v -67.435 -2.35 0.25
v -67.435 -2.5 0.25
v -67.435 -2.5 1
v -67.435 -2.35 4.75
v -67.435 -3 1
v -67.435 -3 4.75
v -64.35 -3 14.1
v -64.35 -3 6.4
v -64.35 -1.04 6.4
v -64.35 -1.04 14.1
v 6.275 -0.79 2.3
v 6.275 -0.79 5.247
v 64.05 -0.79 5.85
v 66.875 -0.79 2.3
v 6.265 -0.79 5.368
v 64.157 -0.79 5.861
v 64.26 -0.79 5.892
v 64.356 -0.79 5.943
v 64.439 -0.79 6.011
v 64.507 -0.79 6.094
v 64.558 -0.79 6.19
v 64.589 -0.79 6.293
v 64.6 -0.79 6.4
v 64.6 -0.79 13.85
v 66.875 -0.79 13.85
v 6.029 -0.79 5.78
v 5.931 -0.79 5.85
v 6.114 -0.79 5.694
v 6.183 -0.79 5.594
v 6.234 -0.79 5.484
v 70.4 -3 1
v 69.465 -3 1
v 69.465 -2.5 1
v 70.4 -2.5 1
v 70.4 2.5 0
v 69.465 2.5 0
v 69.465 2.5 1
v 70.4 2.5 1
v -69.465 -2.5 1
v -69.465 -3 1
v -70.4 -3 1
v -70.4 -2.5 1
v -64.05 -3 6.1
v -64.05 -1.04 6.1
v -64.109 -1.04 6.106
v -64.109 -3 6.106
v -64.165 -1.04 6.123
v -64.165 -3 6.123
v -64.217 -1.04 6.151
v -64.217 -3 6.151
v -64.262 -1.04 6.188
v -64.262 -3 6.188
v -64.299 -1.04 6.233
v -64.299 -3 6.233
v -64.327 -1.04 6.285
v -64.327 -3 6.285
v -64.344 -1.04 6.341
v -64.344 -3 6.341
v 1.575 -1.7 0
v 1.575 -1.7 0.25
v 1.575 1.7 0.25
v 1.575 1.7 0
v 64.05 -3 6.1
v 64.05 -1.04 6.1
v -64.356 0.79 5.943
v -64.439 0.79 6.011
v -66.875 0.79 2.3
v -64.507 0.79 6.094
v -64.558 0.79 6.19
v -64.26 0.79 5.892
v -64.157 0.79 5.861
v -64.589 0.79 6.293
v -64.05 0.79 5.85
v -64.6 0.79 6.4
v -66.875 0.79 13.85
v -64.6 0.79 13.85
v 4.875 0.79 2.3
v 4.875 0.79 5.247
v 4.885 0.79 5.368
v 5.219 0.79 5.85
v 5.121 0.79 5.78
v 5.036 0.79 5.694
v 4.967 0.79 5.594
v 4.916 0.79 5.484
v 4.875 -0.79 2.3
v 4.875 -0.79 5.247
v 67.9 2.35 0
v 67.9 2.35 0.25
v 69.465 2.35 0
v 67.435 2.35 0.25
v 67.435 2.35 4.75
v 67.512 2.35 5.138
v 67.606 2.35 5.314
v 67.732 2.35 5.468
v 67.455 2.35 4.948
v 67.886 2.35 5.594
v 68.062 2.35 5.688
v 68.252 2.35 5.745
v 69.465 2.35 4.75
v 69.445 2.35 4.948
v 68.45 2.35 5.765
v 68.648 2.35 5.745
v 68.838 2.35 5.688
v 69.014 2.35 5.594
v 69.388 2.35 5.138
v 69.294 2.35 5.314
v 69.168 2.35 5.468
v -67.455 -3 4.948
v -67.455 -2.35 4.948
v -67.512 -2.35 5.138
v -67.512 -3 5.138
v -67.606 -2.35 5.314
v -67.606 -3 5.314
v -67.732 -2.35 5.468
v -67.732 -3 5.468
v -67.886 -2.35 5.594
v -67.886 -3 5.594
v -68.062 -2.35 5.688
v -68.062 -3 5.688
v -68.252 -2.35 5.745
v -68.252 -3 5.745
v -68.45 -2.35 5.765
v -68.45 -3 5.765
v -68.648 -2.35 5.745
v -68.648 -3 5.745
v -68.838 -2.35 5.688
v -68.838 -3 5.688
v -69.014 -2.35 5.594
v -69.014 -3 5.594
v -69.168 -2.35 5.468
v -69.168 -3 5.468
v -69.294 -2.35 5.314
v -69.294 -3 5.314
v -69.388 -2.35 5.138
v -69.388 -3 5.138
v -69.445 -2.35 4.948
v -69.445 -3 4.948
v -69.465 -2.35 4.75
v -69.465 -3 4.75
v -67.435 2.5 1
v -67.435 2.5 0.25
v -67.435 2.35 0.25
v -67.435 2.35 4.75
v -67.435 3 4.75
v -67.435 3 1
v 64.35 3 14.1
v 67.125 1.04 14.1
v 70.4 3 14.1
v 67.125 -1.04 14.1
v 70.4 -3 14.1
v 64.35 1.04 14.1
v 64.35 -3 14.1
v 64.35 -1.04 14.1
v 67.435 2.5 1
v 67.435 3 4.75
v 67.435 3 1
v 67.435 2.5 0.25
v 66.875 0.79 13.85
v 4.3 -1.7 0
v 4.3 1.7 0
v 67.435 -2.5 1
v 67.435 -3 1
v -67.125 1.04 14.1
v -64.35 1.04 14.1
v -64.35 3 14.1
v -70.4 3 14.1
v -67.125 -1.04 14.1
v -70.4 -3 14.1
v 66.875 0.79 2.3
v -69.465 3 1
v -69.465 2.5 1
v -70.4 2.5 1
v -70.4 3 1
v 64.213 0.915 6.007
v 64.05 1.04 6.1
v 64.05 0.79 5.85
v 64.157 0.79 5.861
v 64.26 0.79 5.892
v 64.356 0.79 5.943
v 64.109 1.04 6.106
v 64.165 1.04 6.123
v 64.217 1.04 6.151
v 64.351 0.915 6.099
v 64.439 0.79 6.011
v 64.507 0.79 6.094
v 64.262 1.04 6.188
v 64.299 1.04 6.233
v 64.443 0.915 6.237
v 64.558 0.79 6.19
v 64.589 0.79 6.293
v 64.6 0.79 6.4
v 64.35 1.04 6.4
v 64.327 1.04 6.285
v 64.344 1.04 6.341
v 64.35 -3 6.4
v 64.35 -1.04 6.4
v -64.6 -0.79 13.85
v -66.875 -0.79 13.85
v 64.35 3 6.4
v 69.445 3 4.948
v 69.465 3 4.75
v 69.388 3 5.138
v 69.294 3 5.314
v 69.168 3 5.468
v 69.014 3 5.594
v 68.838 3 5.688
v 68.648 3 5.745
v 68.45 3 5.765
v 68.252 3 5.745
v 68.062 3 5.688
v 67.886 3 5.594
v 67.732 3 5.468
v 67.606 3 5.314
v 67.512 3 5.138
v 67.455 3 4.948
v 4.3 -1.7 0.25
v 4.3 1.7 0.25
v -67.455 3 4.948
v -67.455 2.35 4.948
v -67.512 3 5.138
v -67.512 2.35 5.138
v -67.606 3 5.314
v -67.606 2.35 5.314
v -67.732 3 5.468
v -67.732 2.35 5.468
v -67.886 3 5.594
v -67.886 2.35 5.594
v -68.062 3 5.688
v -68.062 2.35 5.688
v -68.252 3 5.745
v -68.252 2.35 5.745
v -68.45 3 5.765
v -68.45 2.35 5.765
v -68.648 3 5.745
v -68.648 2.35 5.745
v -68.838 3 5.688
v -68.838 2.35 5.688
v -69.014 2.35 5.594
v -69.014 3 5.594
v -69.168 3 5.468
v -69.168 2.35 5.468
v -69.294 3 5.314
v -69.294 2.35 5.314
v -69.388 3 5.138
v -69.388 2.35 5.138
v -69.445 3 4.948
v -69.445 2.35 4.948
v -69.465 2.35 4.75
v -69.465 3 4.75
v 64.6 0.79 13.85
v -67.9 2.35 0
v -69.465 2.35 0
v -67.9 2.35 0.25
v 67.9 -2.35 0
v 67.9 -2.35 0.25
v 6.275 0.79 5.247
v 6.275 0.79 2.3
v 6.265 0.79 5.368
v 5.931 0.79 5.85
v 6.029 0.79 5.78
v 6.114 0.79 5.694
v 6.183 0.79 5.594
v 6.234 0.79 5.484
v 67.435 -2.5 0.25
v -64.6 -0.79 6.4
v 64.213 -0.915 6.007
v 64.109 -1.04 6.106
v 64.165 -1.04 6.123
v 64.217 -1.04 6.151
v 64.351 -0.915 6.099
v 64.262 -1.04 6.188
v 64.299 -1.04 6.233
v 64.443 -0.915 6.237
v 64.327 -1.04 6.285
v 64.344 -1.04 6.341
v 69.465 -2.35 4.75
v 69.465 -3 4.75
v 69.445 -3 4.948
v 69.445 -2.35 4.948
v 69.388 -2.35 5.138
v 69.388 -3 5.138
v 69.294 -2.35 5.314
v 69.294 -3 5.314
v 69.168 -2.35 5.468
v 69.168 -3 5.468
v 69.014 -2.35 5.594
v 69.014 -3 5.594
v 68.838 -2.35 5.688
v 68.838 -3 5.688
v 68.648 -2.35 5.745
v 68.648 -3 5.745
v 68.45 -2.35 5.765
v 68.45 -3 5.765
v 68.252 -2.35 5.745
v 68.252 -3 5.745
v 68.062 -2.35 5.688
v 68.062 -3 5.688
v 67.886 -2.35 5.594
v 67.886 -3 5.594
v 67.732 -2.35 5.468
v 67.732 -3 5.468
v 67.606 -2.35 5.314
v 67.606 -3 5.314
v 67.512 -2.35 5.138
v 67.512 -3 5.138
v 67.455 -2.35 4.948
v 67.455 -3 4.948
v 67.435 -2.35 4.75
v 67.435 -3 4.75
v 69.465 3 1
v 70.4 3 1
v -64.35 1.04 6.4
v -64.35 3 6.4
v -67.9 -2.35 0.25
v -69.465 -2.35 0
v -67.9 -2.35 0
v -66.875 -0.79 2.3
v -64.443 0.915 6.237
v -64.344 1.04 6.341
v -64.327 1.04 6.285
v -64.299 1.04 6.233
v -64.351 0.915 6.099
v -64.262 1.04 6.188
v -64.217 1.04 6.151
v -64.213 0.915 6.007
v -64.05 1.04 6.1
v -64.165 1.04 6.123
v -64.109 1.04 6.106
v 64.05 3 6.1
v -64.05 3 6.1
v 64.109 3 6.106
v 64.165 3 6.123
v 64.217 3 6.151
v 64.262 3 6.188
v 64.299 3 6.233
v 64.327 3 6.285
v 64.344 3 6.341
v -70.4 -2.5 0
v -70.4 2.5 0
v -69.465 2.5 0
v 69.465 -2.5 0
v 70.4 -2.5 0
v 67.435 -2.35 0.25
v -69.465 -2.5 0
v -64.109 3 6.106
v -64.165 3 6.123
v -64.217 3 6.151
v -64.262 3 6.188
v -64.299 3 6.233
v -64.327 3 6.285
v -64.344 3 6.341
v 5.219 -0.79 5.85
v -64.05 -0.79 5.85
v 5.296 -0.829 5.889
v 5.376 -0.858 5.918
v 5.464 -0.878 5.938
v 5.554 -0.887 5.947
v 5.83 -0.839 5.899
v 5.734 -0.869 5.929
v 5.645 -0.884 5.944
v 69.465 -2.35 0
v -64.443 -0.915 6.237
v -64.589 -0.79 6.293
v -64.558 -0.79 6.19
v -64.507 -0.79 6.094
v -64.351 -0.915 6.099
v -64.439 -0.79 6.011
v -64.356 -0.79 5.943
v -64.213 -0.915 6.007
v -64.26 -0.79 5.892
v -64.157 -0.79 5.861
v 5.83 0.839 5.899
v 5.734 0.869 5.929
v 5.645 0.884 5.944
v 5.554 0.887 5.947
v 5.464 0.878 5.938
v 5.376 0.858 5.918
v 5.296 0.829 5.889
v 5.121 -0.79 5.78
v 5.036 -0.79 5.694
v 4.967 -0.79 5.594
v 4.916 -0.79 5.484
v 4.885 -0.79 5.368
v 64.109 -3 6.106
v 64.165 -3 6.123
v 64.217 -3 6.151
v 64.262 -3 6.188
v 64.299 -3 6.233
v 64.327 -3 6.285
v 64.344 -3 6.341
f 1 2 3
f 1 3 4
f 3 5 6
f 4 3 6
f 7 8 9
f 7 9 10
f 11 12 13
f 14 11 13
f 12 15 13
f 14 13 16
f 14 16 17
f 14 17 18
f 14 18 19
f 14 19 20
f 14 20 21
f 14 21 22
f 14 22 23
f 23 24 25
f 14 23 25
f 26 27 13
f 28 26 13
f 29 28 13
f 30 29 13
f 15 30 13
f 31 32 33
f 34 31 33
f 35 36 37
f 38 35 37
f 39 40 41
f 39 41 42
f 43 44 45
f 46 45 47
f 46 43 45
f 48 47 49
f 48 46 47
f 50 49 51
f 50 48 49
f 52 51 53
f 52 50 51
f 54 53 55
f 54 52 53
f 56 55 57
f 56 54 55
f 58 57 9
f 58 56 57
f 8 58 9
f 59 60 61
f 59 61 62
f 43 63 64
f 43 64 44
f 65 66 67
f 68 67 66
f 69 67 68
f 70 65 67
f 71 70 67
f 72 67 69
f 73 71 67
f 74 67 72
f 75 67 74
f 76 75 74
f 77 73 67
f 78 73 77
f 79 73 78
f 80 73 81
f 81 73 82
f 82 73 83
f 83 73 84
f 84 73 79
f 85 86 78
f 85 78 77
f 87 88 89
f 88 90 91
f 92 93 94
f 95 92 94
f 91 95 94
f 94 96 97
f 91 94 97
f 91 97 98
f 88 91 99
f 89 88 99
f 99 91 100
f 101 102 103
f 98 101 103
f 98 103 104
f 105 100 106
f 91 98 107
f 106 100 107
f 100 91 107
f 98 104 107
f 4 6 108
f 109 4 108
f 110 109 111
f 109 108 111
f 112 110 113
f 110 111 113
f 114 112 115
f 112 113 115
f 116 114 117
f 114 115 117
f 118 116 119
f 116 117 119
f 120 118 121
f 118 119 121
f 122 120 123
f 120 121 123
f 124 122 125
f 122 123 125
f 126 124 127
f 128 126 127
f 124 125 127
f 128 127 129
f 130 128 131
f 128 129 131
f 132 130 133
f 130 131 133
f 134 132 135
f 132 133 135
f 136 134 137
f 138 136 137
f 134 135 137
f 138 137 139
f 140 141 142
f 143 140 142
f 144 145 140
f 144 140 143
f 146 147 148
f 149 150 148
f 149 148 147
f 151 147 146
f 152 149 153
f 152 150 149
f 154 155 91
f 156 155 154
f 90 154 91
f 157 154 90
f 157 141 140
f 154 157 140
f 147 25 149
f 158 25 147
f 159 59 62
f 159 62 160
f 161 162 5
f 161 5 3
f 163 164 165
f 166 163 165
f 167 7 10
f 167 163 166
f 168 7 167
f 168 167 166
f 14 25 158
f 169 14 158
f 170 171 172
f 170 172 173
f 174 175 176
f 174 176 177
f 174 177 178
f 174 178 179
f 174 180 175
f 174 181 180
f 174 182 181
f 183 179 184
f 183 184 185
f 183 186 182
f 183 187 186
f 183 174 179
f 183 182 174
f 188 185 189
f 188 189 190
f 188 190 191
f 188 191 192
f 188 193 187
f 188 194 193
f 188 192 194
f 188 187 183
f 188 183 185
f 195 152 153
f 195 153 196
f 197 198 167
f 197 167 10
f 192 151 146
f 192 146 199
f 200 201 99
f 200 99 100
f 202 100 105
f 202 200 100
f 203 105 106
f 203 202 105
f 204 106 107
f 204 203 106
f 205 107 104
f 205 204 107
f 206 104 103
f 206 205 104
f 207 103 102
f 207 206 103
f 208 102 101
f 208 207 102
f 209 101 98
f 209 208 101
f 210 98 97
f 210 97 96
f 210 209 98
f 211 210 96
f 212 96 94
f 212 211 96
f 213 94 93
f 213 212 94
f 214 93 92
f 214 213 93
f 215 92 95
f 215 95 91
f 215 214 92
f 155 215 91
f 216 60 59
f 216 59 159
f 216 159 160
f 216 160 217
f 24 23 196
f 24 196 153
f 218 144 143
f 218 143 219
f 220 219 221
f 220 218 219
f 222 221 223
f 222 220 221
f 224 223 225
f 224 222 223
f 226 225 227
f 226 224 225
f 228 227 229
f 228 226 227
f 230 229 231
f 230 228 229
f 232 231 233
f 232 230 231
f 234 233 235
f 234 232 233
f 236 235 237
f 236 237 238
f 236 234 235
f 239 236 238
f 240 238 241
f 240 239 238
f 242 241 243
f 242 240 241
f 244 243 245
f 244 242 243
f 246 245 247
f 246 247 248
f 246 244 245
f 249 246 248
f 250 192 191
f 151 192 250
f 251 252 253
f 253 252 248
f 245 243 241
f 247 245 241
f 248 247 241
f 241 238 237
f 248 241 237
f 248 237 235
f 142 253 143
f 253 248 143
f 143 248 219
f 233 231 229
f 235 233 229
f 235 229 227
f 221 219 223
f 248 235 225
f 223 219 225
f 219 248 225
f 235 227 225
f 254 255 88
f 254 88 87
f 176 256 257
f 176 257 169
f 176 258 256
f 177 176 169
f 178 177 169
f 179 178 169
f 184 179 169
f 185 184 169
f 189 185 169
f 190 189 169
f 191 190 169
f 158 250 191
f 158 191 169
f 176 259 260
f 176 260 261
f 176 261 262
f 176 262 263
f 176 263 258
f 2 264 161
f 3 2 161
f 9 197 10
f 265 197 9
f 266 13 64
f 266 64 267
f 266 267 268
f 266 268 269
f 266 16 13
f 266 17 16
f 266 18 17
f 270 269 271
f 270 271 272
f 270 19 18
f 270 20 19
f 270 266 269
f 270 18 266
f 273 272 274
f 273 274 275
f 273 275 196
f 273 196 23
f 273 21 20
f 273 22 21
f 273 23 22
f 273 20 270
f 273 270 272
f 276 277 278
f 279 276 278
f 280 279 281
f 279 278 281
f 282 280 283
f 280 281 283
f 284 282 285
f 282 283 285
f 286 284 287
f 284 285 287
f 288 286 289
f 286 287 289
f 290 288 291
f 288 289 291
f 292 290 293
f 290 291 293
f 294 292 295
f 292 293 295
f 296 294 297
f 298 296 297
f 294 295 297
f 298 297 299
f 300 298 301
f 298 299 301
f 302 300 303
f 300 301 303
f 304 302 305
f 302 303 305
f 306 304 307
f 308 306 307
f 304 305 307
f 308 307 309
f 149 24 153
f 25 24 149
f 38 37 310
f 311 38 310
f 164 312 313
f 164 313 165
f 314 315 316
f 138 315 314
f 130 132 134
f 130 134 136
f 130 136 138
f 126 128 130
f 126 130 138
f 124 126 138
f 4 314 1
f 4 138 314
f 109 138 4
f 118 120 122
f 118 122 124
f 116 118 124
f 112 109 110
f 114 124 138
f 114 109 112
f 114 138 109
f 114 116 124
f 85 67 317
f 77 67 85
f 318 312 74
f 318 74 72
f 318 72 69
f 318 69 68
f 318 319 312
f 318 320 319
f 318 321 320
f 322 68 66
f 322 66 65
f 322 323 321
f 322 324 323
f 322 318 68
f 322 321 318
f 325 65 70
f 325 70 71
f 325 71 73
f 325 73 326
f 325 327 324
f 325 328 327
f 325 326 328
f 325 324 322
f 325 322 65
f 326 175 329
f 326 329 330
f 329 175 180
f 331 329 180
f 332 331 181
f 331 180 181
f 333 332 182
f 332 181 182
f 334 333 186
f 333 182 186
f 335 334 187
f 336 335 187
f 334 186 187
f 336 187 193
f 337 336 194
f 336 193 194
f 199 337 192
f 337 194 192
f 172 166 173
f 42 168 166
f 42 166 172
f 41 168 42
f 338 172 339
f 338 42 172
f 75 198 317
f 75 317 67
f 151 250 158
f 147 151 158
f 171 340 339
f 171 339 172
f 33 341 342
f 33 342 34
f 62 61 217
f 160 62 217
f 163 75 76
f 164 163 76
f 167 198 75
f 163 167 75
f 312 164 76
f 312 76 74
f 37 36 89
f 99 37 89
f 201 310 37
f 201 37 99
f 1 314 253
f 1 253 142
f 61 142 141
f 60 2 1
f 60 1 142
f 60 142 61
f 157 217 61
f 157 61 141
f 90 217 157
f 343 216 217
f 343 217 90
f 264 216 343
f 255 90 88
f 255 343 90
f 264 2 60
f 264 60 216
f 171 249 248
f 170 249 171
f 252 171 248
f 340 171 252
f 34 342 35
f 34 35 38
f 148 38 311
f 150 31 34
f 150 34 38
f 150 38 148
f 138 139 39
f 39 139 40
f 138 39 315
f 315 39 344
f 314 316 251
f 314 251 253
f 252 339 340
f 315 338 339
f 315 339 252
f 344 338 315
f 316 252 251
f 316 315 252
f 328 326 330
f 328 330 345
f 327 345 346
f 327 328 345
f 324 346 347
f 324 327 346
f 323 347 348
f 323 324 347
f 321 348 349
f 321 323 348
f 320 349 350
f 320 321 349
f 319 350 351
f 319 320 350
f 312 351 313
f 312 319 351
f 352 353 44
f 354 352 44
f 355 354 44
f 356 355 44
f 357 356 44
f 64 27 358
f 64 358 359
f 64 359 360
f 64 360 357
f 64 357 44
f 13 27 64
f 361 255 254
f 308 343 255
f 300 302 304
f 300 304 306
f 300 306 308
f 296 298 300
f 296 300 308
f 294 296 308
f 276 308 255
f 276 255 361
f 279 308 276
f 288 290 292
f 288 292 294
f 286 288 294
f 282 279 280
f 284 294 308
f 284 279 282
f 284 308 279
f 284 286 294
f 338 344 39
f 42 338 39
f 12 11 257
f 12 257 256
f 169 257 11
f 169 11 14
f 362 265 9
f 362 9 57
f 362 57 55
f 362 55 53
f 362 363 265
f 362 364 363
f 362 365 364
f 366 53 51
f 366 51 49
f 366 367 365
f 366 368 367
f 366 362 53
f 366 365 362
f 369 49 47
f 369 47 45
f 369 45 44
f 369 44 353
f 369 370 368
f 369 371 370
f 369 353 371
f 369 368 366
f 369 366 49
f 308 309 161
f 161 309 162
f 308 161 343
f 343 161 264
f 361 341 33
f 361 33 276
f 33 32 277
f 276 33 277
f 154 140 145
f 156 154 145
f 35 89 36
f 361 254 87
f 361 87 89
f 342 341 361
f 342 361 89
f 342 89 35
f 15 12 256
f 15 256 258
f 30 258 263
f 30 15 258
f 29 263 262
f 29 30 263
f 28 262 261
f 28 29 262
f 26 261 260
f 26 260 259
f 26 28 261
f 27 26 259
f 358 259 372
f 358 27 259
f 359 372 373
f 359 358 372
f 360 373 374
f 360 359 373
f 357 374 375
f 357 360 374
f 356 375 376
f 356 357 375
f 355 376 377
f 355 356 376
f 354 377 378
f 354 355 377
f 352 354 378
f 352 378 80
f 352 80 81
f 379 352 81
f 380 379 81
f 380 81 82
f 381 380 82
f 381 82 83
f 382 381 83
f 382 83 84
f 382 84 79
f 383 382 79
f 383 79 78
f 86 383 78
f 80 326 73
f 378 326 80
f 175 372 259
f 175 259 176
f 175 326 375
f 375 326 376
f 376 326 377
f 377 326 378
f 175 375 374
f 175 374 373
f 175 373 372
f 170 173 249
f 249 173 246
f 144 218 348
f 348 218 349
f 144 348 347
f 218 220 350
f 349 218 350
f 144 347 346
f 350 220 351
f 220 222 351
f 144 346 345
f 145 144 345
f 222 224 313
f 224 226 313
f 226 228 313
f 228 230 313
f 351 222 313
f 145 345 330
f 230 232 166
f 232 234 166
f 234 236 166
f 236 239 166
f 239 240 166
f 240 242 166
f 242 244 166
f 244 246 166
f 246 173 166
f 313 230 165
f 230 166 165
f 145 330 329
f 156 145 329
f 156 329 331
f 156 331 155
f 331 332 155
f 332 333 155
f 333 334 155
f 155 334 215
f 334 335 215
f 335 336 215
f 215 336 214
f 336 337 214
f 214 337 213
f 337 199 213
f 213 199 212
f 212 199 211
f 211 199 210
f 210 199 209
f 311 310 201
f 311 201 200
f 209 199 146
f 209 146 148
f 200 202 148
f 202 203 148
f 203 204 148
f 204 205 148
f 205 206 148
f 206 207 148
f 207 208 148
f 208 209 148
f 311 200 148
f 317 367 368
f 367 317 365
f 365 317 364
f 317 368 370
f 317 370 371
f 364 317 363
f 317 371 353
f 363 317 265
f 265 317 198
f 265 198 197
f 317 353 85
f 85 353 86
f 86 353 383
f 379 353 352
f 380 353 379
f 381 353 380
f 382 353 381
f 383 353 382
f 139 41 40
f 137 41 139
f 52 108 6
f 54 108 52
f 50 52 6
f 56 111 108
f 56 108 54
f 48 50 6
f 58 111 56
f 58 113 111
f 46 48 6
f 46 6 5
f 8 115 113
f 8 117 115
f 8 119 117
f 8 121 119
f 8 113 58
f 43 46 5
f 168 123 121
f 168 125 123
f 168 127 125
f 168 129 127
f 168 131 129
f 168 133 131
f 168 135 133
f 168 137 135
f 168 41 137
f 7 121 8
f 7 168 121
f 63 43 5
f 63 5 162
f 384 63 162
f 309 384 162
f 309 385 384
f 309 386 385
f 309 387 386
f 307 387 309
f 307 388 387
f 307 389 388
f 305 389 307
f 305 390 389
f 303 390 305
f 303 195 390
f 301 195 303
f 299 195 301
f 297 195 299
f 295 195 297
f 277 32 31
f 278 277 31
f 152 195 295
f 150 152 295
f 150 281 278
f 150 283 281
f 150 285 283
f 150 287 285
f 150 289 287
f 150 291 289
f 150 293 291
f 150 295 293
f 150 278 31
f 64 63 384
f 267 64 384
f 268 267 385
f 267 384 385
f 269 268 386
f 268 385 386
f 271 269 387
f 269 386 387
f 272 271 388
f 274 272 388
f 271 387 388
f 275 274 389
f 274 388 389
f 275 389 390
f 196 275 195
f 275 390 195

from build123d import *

# Parameters (mm, degrees)
F13_DEPTH     = 3
F0_DEPTH      = 0.65
F2_W          = 2.725
F2_H          = 0.25
F3_DEPTH      = 1.3
F4_W          = 0.5
F4_H          = 1
F5_DEPTH      = 70.401
F5_DEPTH_BACK = 70.401
F6_W          = 133.75
F6_H          = 1.58
F7_DEPTH      = 11.8
F8_R          = 0.3
F9_SIZE       = 0.25
F11_DEPTH     = 1


# Not quite as in the source:
# - a pattern or mirror of a feature is missing from the dataset's text; its kind, count and spacing are read off the source's solid


with BuildPart() as f13:
    # F12 (on Front) → F13 (new body, symmetric)
    with BuildSketch(Plane.XZ):
        Polygon((-67.9, 0), (-67.9, 0.25), (1.575, 0.25), (1.575, 0), (4.3, 0), (4.3, 0.25), (67.9, 0.25), (67.9, 0), (70.4, 0), (70.4, 14.1), (64.35, 14.1), (64.35, 6.1), (-64.35, 6.1), (-64.35, 14.1), (-70.4, 14.1), (-70.4, 0), align=None)
    extrude(amount=F13_DEPTH, both=True)

    # F15: F0, F0b across plane


with BuildPart() as f0:
    # F14 (on face) → F0 (new body)
    with BuildSketch(Plane.XZ.offset(3)):
        with BuildLine():
            Line((-69.465, 4.75), (-69.465, 0))
            Line((-69.465, 0), (-67.9, 0))
            Line((-67.9, 0), (-67.9, 0.25))
            Line((-67.9, 0.25), (-67.435, 0.25))
            Line((-67.435, 0.25), (-67.435, 4.75))
            ThreePointArc((-67.435, 4.75), (-68.45, 5.765), (-69.465, 4.75))
        make_face()
    extrude(amount=-F0_DEPTH)


with BuildPart() as f0b:
    # F14 (on face) → F0, piece 2 (new body)
    with BuildSketch(Plane.XZ.offset(3)):
        with BuildLine():
            Line((67.9, 0.25), (67.9, 0))
            Line((67.9, 0), (69.465, 0))
            Line((69.465, 0), (69.465, 4.75))
            ThreePointArc((69.465, 4.75), (68.45, 5.765), (67.435, 4.75))
            Line((67.435, 4.75), (67.435, 0.25))
            Line((67.435, 0.25), (67.9, 0.25))
        make_face()
    extrude(amount=-F0_DEPTH)


with BuildPart() as f13_1:
    add(f13.part)
    add(f0.part.mirror(Plane.XZ), mode=Mode.SUBTRACT)
    add(f0b.part.mirror(Plane.XZ), mode=Mode.SUBTRACT)

    # F1: cut F0, F0b
    add(f0.part, mode=Mode.SUBTRACT)
    add(f0b.part, mode=Mode.SUBTRACT)

    # F2 (on face) → F3 (cut)
    with BuildSketch(Plane.XZ.offset(3)):
        with Locations((2.9375, 0.125)):
            Rectangle(F2_W, F2_H)
    f3 = extrude(amount=-F3_DEPTH, mode=Mode.SUBTRACT)

    # F3_copies: F3 across plane
    add(f3.mirror(Plane.ZX), mode=Mode.SUBTRACT)

    # F4 (on Right) → F5 (cut, two sides)
    with BuildSketch(Plane.YZ) as f5_sk:
        with Locations((-2.75, 0.5)):
            Rectangle(F4_W, F4_H)
        with Locations((2.75, 0.5)):
            Rectangle(F4_W, F4_H)
    extrude(amount=-F5_DEPTH, mode=Mode.SUBTRACT)
    extrude(f5_sk.sketch, amount=F5_DEPTH_BACK, mode=Mode.SUBTRACT)

    # F6 (on face) → F7 (cut)
    with BuildSketch(Plane.XY.offset(14.1)):
        Rectangle(F6_W, F6_H)
    extrude(amount=-F7_DEPTH, mode=Mode.SUBTRACT)

    # F8
    f8_edges = [f13_1.edges().sort_by_distance(p)[0] for p in [
        (-64.35, 1.895, 6.1),
        (-64.35, -1.895, 6.1),
        (64.35, 1.895, 6.1),
        (64.35, -1.895, 6.1),
    ]]
    fillet(f8_edges, radius=F8_R)

    # F9
    f9_edges = [f13_1.edges().sort_by_distance(p)[0] for p in [
        (-65.6125, 0.79, 14.1),
        (-66.875, 0, 14.1),
        (-65.6125, -0.79, 14.1),
        (-64.35, 0.79, 10.25),
        (-64.35, -0.79, 10.25),
        (65.6125, 0.79, 14.1),
        (66.875, 0, 14.1),
        (65.6125, -0.79, 14.1),
        (-64.262132, -0.79, 6.187868),
        (0, -0.79, 6.1),
        (64.262132, -0.79, 6.187868),
        (64.35, -0.79, 10.25),
        (64.35, 0.79, 10.25),
        (64.262132, 0.79, 6.187868),
        (0, 0.79, 6.1),
        (-64.262132, 0.79, 6.187868),
    ]]
    chamfer(f9_edges, length=F9_SIZE)

    # F10 (on Front) → F11 (join, symmetric)
    with BuildSketch(Plane.XZ):
        with BuildLine():
            Line((6.275, 2.3), (6.275, 5.247))
            ThreePointArc((6.275, 5.247), (5.575, 5.947), (4.875, 5.247))
            Line((4.875, 5.247), (4.875, 2.3))
            Line((4.875, 2.3), (6.275, 2.3))
        make_face()
    extrude(amount=F11_DEPTH, both=True)


solid = f13_1.part
